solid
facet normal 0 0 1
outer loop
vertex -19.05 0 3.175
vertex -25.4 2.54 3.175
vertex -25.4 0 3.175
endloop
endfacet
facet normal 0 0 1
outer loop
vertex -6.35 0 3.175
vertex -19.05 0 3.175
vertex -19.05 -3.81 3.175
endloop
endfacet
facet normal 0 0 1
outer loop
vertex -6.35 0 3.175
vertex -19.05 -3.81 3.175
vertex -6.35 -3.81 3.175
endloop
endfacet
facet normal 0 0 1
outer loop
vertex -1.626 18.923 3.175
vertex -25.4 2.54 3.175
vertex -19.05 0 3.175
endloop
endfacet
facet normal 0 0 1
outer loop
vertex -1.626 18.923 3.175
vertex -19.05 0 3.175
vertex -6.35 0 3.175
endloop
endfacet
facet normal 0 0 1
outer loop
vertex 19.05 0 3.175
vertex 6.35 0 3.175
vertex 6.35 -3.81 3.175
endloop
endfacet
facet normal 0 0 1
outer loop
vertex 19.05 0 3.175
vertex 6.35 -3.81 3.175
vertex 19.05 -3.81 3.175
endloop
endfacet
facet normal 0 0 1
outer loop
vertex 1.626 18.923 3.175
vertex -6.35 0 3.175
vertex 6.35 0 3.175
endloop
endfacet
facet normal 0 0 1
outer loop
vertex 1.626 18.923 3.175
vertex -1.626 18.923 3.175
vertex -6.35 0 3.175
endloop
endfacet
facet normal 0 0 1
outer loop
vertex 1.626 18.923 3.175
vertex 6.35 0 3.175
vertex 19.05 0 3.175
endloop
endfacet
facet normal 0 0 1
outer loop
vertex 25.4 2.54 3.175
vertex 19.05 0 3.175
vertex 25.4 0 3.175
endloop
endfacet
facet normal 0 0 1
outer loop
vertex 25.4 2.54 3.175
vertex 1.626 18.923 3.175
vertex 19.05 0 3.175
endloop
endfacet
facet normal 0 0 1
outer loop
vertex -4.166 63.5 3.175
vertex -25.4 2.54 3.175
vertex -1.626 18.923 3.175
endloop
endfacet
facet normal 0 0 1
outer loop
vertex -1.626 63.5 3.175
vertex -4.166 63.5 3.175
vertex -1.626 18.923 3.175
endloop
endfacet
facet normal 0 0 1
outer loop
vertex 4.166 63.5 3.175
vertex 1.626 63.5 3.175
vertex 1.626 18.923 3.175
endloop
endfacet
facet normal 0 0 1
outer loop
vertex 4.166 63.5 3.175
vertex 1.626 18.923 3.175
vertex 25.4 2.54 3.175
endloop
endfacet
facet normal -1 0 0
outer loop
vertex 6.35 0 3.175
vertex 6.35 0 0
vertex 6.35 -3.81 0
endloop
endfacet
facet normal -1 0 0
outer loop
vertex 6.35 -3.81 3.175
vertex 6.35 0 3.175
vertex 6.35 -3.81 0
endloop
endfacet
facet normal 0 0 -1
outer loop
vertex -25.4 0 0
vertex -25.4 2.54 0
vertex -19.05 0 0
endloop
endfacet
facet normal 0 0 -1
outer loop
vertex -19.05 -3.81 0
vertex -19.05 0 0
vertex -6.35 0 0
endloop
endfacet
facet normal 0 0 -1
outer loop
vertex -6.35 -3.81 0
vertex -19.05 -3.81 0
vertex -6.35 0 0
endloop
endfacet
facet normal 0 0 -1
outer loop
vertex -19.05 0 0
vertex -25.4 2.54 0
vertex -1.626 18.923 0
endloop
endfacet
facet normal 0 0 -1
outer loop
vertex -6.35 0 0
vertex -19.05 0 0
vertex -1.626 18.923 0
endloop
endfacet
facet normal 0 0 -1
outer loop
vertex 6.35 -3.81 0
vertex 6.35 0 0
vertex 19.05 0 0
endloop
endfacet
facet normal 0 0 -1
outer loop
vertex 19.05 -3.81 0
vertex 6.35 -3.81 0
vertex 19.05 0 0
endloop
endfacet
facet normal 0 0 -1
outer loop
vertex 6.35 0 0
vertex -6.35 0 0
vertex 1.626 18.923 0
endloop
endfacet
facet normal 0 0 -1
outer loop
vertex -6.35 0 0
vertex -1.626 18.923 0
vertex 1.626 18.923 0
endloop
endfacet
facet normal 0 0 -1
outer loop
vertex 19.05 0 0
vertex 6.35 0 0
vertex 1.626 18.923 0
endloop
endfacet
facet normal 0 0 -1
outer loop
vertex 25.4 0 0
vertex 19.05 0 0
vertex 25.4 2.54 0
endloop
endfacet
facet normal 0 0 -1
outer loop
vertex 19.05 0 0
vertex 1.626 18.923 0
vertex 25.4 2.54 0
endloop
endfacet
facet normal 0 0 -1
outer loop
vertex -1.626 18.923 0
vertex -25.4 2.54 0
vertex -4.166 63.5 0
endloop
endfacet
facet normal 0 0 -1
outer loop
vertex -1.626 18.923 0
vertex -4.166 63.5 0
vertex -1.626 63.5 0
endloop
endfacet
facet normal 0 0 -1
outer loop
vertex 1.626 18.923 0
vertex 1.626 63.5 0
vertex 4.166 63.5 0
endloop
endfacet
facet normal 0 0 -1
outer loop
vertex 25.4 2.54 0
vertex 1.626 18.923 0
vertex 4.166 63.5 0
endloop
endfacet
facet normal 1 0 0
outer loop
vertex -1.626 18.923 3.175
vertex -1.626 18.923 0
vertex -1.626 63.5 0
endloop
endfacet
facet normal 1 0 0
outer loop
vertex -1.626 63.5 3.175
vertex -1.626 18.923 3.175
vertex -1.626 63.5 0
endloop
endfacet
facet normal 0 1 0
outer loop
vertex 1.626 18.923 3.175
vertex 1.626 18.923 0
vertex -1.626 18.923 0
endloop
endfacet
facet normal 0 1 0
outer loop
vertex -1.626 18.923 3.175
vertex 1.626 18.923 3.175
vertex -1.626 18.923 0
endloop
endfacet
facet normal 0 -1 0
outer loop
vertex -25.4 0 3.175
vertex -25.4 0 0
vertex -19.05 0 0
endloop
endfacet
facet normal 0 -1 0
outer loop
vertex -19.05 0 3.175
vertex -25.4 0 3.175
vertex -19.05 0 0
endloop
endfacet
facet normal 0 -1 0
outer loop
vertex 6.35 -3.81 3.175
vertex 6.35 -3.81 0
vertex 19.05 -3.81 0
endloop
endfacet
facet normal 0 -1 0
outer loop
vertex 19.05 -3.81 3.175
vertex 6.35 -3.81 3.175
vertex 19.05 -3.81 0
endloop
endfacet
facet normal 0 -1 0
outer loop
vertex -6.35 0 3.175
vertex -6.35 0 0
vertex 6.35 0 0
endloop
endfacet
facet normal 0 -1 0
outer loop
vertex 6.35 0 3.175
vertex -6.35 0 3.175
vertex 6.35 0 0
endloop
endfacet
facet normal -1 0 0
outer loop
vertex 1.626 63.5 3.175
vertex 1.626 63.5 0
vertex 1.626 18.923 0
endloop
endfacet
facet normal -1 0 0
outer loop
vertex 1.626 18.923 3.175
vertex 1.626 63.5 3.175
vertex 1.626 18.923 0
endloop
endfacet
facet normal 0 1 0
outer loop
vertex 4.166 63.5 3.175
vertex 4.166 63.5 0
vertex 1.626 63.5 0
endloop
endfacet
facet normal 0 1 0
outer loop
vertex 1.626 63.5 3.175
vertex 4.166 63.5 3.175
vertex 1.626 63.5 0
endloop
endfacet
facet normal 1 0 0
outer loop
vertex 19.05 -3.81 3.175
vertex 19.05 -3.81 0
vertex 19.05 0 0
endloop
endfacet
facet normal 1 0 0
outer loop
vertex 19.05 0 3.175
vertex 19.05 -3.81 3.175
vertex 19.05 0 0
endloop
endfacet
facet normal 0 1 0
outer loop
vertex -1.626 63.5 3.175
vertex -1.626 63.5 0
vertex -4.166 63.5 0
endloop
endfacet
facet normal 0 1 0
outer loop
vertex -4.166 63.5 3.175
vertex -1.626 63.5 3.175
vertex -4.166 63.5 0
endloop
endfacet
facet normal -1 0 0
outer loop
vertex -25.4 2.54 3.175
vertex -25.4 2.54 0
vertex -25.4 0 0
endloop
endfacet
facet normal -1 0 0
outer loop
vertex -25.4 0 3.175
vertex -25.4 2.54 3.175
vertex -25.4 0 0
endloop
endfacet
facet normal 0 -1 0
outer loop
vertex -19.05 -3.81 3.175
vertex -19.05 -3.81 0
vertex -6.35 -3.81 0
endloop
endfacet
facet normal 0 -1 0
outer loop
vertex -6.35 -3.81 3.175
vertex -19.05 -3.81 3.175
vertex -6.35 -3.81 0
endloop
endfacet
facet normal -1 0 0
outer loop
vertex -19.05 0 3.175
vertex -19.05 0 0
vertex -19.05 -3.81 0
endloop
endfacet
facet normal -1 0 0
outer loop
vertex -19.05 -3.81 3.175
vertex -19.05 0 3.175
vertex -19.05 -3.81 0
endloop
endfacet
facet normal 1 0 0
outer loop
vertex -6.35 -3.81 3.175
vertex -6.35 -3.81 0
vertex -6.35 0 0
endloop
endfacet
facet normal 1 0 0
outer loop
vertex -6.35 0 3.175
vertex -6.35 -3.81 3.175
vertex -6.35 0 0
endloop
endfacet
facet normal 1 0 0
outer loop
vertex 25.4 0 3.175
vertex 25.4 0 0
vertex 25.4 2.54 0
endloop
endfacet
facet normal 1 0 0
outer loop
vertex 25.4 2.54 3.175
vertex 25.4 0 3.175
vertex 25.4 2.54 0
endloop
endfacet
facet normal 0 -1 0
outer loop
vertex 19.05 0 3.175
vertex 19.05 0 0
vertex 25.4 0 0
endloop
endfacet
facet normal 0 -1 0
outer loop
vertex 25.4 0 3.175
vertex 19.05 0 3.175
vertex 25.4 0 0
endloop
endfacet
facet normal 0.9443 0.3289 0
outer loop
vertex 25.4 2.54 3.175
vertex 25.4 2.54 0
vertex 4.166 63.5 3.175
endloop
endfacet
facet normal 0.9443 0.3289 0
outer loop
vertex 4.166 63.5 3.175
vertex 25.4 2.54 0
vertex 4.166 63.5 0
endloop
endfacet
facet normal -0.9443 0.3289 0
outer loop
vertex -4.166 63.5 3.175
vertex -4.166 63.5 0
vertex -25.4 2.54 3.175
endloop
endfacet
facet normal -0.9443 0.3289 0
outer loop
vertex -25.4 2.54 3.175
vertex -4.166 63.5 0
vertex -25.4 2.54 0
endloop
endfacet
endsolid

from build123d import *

# Parameters (mm, degrees)
BOSS_EXTRUDE1_DEPTH = 3.175


with BuildPart() as part:
    # Sketch1 → Boss-Extrude1 (new body)
    with BuildSketch(Plane.XY):
        Polygon((-1.6256, 18.923), (-1.6256, 63.5), (-4.1656, 63.5), (-25.4, 2.54), (-25.4, 0), (-19.05, 0), (-19.05, -3.81), (-6.35, -3.81), (-6.35, 0), (0, 0), (6.35, 0), (6.35, -3.81), (19.05, -3.81), (19.05, 0), (25.4, 0), (25.4, 2.54), (4.1656, 63.5), (1.6256, 63.5), (1.6256, 18.923), align=None)
    extrude(amount=BOSS_EXTRUDE1_DEPTH)


solid = part.part
